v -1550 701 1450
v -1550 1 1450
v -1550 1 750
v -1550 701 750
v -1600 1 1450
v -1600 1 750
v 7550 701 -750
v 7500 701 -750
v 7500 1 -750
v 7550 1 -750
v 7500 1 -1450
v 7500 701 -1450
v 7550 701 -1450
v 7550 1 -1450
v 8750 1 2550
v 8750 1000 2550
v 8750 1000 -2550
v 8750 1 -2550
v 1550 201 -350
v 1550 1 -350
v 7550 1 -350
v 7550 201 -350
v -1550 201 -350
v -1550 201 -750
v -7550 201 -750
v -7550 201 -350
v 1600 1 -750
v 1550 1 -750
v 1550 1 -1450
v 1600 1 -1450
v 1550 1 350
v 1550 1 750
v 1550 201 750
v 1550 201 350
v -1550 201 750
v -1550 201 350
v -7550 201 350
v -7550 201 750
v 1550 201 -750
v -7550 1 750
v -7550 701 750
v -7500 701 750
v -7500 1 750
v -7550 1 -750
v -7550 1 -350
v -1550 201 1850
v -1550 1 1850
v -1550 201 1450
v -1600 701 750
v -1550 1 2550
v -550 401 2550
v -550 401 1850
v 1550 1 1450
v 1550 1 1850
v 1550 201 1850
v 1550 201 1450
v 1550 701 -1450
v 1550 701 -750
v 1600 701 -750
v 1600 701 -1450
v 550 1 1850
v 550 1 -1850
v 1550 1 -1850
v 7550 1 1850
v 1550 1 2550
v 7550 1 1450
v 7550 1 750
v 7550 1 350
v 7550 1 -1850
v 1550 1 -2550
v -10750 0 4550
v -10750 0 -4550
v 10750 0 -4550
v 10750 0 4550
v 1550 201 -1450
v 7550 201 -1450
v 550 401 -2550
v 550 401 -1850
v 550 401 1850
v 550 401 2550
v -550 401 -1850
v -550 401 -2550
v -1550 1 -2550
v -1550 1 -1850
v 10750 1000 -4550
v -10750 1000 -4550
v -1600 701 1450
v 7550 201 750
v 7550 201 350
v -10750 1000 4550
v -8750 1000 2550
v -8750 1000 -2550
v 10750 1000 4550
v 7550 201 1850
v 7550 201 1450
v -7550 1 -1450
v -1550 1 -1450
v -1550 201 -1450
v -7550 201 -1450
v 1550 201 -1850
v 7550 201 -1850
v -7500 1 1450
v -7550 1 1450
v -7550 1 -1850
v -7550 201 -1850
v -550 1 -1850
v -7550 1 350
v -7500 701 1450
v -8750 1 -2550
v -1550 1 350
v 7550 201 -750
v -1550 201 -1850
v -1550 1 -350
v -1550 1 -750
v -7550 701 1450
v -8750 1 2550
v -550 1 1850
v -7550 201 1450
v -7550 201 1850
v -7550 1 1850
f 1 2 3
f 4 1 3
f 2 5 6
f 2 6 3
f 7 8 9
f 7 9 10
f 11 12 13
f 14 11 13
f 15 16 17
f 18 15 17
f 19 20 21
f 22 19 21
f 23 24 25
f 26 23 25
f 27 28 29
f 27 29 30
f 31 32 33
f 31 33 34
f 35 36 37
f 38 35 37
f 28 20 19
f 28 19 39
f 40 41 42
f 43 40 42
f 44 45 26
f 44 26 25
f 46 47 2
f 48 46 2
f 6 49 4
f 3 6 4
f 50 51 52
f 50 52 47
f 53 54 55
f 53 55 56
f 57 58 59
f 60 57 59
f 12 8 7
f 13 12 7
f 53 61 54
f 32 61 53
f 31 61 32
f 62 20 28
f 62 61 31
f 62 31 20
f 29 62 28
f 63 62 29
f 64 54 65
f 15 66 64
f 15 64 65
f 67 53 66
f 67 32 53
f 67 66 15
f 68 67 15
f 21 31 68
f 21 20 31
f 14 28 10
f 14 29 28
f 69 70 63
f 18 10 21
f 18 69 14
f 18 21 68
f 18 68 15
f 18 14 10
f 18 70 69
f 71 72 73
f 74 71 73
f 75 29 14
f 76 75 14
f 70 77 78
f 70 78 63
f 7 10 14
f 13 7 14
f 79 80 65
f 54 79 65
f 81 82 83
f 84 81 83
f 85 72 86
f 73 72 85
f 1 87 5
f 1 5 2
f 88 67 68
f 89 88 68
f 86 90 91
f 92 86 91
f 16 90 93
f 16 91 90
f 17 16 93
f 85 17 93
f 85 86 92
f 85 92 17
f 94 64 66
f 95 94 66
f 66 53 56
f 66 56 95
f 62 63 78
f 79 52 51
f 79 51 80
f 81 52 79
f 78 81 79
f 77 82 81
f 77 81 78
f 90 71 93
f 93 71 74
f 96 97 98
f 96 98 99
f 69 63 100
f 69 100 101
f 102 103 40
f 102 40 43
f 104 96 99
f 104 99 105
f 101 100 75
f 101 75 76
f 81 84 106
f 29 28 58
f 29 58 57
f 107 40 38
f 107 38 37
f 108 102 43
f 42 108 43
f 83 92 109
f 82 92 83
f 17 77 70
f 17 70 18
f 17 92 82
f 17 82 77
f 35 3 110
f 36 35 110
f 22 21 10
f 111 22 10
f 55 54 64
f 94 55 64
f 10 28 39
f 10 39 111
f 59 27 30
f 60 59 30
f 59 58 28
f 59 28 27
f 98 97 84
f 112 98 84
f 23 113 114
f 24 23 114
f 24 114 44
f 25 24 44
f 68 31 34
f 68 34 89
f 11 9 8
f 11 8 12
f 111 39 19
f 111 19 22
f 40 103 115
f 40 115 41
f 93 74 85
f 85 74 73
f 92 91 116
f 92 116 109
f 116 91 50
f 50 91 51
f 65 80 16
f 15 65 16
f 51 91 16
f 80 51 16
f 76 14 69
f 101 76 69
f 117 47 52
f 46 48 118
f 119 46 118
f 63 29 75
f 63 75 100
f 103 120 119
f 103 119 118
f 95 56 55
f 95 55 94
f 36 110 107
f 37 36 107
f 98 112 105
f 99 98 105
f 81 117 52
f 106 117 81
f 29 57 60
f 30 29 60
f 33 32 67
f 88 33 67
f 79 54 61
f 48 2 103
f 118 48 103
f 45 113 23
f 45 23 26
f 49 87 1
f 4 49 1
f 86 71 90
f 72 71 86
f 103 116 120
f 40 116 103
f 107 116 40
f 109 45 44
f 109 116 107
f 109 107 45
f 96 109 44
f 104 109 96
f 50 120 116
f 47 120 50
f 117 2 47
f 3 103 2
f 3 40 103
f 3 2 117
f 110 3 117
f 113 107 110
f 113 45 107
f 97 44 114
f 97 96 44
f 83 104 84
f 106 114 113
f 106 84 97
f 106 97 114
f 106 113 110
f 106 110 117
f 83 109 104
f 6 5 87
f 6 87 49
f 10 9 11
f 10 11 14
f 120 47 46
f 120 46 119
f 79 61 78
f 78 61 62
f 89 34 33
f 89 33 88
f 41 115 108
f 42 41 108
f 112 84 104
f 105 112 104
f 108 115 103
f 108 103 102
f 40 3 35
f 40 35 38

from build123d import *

# Parameters (mm, degrees)
SKETCH_1_W          = 21500
SKETCH_1_H          = 9100
EXTRUDE_1_DEPTH     = 1000
SKETCH_2_W          = 17500
SKETCH_2_H          = 5100
CUT_EXTRUDE_2_DEPTH = 999
SKETCH_3_W          = 1100
SKETCH_3_H          = 5100
EXTRUDE_3_DEPTH     = 400
EXTRUDE_4_DEPTH     = 700
EXTRUDE_5_DEPTH     = 700
SKETCH_7_W          = 6000
SKETCH_7_H          = 400
EXTRUDE_6_DEPTH     = 200
SKETCH_9_W          = 50
SKETCH_9_H          = 700
EXTRUDE_7_DEPTH     = 700
EXTRUDE_7_2_DEPTH   = 700
EXTRUDE_7_3_DEPTH   = 700
EXTRUDE_7_4_DEPTH   = 700


with BuildPart() as part:
    # 草圖1 → 伸長1 (new body)
    with BuildSketch(Plane(origin=(0, 0, 0), x_dir=(1, 0, 0), z_dir=(0, 1, 0))):
        Rectangle(SKETCH_1_W, SKETCH_1_H)
    extrude(amount=EXTRUDE_1_DEPTH)

    # 草圖2 → 伸長2 (cut)
    with BuildSketch(Plane(origin=(0, 1000, 0), x_dir=(1, 0, 0), z_dir=(0, 1, 0))):
        Rectangle(SKETCH_2_W, SKETCH_2_H)
    extrude(amount=-CUT_EXTRUDE_2_DEPTH, mode=Mode.SUBTRACT)

    # 草圖3 → 伸長3 (add)
    with BuildSketch(Plane(origin=(0, 1, 0), x_dir=(1, 0, 0), z_dir=(0, 1, 0))):
        Rectangle(SKETCH_3_W, SKETCH_3_H)
    extrude(amount=EXTRUDE_3_DEPTH)

    # 草圖5 → 伸長4 (add)
    with BuildSketch(Plane.XY.offset(-2550)):
        Polygon((550, 401), (1550, 1), (550, 1), align=None)
        Polygon((-550, 1), (-550, 401), (-1550, 1), align=None)
    extrude(amount=EXTRUDE_4_DEPTH)

    # 草圖6 → 伸長5 (add)
    with BuildSketch(Plane(origin=(0, 0, 2550), x_dir=(-1, 0, 0), z_dir=(0, 0, -1))):
        Polygon((-550, 1), (-550, 401), (-1550, 1), align=None)
        Polygon((550, 1), (550, 401), (1550, 1), align=None)
    extrude(amount=EXTRUDE_5_DEPTH)

    # 草圖7 → 伸長6 (add)
    with BuildSketch(Plane(origin=(0, 1, 0), x_dir=(1, 0, 0), z_dir=(0, 1, 0))):
        with Locations((4550, 1650)):
            Rectangle(SKETCH_7_W, SKETCH_7_H)
        with Locations((4550, -1650)):
            Rectangle(SKETCH_7_W, SKETCH_7_H)
        with Locations((4550, 550)):
            Rectangle(SKETCH_7_W, SKETCH_7_H)
        with Locations((4550, -550)):
            Rectangle(SKETCH_7_W, SKETCH_7_H)
    extrude_6 = extrude(amount=EXTRUDE_6_DEPTH)

    # 鏡射1: 伸長6 across plane
    add(extrude_6.mirror(Plane(origin=(0, 0, 0), x_dir=(0, 0, 1), z_dir=(1, 0, 0))))


with BuildPart() as body_2:
    # 草圖9 → 伸長7 (new body)
    with BuildSketch(Plane(origin=(0, 1, 0), x_dir=(1, 0, 0), z_dir=(0, 1, 0))):
        with Locations((-7525, -1100)):
            Rectangle(SKETCH_9_W, SKETCH_9_H)
    extrude(amount=EXTRUDE_7_DEPTH)


with BuildPart() as body_3:
    # 草圖9 → Extrude 7 2 (new body)
    with BuildSketch(Plane(origin=(0, 1, 0), x_dir=(1, 0, 0), z_dir=(0, 1, 0))):
        with Locations((7525, 1100)):
            Rectangle(SKETCH_9_W, SKETCH_9_H)
    extrude(amount=EXTRUDE_7_2_DEPTH)


with BuildPart() as body_4:
    # 草圖9 → Extrude 7 3 (new body)
    with BuildSketch(Plane(origin=(0, 1, 0), x_dir=(1, 0, 0), z_dir=(0, 1, 0))):
        with Locations((-1575, -1100)):
            Rectangle(SKETCH_9_W, SKETCH_9_H)
    extrude(amount=EXTRUDE_7_3_DEPTH)


with BuildPart() as body_5:
    # 草圖9 → Extrude 7 4 (new body)
    with BuildSketch(Plane(origin=(0, 1, 0), x_dir=(1, 0, 0), z_dir=(0, 1, 0))):
        with Locations((1575, 1100)):
            Rectangle(SKETCH_9_W, SKETCH_9_H)
    extrude(amount=EXTRUDE_7_4_DEPTH)


solid = Compound([part.part, body_2.part, body_3.part, body_4.part, body_5.part])
